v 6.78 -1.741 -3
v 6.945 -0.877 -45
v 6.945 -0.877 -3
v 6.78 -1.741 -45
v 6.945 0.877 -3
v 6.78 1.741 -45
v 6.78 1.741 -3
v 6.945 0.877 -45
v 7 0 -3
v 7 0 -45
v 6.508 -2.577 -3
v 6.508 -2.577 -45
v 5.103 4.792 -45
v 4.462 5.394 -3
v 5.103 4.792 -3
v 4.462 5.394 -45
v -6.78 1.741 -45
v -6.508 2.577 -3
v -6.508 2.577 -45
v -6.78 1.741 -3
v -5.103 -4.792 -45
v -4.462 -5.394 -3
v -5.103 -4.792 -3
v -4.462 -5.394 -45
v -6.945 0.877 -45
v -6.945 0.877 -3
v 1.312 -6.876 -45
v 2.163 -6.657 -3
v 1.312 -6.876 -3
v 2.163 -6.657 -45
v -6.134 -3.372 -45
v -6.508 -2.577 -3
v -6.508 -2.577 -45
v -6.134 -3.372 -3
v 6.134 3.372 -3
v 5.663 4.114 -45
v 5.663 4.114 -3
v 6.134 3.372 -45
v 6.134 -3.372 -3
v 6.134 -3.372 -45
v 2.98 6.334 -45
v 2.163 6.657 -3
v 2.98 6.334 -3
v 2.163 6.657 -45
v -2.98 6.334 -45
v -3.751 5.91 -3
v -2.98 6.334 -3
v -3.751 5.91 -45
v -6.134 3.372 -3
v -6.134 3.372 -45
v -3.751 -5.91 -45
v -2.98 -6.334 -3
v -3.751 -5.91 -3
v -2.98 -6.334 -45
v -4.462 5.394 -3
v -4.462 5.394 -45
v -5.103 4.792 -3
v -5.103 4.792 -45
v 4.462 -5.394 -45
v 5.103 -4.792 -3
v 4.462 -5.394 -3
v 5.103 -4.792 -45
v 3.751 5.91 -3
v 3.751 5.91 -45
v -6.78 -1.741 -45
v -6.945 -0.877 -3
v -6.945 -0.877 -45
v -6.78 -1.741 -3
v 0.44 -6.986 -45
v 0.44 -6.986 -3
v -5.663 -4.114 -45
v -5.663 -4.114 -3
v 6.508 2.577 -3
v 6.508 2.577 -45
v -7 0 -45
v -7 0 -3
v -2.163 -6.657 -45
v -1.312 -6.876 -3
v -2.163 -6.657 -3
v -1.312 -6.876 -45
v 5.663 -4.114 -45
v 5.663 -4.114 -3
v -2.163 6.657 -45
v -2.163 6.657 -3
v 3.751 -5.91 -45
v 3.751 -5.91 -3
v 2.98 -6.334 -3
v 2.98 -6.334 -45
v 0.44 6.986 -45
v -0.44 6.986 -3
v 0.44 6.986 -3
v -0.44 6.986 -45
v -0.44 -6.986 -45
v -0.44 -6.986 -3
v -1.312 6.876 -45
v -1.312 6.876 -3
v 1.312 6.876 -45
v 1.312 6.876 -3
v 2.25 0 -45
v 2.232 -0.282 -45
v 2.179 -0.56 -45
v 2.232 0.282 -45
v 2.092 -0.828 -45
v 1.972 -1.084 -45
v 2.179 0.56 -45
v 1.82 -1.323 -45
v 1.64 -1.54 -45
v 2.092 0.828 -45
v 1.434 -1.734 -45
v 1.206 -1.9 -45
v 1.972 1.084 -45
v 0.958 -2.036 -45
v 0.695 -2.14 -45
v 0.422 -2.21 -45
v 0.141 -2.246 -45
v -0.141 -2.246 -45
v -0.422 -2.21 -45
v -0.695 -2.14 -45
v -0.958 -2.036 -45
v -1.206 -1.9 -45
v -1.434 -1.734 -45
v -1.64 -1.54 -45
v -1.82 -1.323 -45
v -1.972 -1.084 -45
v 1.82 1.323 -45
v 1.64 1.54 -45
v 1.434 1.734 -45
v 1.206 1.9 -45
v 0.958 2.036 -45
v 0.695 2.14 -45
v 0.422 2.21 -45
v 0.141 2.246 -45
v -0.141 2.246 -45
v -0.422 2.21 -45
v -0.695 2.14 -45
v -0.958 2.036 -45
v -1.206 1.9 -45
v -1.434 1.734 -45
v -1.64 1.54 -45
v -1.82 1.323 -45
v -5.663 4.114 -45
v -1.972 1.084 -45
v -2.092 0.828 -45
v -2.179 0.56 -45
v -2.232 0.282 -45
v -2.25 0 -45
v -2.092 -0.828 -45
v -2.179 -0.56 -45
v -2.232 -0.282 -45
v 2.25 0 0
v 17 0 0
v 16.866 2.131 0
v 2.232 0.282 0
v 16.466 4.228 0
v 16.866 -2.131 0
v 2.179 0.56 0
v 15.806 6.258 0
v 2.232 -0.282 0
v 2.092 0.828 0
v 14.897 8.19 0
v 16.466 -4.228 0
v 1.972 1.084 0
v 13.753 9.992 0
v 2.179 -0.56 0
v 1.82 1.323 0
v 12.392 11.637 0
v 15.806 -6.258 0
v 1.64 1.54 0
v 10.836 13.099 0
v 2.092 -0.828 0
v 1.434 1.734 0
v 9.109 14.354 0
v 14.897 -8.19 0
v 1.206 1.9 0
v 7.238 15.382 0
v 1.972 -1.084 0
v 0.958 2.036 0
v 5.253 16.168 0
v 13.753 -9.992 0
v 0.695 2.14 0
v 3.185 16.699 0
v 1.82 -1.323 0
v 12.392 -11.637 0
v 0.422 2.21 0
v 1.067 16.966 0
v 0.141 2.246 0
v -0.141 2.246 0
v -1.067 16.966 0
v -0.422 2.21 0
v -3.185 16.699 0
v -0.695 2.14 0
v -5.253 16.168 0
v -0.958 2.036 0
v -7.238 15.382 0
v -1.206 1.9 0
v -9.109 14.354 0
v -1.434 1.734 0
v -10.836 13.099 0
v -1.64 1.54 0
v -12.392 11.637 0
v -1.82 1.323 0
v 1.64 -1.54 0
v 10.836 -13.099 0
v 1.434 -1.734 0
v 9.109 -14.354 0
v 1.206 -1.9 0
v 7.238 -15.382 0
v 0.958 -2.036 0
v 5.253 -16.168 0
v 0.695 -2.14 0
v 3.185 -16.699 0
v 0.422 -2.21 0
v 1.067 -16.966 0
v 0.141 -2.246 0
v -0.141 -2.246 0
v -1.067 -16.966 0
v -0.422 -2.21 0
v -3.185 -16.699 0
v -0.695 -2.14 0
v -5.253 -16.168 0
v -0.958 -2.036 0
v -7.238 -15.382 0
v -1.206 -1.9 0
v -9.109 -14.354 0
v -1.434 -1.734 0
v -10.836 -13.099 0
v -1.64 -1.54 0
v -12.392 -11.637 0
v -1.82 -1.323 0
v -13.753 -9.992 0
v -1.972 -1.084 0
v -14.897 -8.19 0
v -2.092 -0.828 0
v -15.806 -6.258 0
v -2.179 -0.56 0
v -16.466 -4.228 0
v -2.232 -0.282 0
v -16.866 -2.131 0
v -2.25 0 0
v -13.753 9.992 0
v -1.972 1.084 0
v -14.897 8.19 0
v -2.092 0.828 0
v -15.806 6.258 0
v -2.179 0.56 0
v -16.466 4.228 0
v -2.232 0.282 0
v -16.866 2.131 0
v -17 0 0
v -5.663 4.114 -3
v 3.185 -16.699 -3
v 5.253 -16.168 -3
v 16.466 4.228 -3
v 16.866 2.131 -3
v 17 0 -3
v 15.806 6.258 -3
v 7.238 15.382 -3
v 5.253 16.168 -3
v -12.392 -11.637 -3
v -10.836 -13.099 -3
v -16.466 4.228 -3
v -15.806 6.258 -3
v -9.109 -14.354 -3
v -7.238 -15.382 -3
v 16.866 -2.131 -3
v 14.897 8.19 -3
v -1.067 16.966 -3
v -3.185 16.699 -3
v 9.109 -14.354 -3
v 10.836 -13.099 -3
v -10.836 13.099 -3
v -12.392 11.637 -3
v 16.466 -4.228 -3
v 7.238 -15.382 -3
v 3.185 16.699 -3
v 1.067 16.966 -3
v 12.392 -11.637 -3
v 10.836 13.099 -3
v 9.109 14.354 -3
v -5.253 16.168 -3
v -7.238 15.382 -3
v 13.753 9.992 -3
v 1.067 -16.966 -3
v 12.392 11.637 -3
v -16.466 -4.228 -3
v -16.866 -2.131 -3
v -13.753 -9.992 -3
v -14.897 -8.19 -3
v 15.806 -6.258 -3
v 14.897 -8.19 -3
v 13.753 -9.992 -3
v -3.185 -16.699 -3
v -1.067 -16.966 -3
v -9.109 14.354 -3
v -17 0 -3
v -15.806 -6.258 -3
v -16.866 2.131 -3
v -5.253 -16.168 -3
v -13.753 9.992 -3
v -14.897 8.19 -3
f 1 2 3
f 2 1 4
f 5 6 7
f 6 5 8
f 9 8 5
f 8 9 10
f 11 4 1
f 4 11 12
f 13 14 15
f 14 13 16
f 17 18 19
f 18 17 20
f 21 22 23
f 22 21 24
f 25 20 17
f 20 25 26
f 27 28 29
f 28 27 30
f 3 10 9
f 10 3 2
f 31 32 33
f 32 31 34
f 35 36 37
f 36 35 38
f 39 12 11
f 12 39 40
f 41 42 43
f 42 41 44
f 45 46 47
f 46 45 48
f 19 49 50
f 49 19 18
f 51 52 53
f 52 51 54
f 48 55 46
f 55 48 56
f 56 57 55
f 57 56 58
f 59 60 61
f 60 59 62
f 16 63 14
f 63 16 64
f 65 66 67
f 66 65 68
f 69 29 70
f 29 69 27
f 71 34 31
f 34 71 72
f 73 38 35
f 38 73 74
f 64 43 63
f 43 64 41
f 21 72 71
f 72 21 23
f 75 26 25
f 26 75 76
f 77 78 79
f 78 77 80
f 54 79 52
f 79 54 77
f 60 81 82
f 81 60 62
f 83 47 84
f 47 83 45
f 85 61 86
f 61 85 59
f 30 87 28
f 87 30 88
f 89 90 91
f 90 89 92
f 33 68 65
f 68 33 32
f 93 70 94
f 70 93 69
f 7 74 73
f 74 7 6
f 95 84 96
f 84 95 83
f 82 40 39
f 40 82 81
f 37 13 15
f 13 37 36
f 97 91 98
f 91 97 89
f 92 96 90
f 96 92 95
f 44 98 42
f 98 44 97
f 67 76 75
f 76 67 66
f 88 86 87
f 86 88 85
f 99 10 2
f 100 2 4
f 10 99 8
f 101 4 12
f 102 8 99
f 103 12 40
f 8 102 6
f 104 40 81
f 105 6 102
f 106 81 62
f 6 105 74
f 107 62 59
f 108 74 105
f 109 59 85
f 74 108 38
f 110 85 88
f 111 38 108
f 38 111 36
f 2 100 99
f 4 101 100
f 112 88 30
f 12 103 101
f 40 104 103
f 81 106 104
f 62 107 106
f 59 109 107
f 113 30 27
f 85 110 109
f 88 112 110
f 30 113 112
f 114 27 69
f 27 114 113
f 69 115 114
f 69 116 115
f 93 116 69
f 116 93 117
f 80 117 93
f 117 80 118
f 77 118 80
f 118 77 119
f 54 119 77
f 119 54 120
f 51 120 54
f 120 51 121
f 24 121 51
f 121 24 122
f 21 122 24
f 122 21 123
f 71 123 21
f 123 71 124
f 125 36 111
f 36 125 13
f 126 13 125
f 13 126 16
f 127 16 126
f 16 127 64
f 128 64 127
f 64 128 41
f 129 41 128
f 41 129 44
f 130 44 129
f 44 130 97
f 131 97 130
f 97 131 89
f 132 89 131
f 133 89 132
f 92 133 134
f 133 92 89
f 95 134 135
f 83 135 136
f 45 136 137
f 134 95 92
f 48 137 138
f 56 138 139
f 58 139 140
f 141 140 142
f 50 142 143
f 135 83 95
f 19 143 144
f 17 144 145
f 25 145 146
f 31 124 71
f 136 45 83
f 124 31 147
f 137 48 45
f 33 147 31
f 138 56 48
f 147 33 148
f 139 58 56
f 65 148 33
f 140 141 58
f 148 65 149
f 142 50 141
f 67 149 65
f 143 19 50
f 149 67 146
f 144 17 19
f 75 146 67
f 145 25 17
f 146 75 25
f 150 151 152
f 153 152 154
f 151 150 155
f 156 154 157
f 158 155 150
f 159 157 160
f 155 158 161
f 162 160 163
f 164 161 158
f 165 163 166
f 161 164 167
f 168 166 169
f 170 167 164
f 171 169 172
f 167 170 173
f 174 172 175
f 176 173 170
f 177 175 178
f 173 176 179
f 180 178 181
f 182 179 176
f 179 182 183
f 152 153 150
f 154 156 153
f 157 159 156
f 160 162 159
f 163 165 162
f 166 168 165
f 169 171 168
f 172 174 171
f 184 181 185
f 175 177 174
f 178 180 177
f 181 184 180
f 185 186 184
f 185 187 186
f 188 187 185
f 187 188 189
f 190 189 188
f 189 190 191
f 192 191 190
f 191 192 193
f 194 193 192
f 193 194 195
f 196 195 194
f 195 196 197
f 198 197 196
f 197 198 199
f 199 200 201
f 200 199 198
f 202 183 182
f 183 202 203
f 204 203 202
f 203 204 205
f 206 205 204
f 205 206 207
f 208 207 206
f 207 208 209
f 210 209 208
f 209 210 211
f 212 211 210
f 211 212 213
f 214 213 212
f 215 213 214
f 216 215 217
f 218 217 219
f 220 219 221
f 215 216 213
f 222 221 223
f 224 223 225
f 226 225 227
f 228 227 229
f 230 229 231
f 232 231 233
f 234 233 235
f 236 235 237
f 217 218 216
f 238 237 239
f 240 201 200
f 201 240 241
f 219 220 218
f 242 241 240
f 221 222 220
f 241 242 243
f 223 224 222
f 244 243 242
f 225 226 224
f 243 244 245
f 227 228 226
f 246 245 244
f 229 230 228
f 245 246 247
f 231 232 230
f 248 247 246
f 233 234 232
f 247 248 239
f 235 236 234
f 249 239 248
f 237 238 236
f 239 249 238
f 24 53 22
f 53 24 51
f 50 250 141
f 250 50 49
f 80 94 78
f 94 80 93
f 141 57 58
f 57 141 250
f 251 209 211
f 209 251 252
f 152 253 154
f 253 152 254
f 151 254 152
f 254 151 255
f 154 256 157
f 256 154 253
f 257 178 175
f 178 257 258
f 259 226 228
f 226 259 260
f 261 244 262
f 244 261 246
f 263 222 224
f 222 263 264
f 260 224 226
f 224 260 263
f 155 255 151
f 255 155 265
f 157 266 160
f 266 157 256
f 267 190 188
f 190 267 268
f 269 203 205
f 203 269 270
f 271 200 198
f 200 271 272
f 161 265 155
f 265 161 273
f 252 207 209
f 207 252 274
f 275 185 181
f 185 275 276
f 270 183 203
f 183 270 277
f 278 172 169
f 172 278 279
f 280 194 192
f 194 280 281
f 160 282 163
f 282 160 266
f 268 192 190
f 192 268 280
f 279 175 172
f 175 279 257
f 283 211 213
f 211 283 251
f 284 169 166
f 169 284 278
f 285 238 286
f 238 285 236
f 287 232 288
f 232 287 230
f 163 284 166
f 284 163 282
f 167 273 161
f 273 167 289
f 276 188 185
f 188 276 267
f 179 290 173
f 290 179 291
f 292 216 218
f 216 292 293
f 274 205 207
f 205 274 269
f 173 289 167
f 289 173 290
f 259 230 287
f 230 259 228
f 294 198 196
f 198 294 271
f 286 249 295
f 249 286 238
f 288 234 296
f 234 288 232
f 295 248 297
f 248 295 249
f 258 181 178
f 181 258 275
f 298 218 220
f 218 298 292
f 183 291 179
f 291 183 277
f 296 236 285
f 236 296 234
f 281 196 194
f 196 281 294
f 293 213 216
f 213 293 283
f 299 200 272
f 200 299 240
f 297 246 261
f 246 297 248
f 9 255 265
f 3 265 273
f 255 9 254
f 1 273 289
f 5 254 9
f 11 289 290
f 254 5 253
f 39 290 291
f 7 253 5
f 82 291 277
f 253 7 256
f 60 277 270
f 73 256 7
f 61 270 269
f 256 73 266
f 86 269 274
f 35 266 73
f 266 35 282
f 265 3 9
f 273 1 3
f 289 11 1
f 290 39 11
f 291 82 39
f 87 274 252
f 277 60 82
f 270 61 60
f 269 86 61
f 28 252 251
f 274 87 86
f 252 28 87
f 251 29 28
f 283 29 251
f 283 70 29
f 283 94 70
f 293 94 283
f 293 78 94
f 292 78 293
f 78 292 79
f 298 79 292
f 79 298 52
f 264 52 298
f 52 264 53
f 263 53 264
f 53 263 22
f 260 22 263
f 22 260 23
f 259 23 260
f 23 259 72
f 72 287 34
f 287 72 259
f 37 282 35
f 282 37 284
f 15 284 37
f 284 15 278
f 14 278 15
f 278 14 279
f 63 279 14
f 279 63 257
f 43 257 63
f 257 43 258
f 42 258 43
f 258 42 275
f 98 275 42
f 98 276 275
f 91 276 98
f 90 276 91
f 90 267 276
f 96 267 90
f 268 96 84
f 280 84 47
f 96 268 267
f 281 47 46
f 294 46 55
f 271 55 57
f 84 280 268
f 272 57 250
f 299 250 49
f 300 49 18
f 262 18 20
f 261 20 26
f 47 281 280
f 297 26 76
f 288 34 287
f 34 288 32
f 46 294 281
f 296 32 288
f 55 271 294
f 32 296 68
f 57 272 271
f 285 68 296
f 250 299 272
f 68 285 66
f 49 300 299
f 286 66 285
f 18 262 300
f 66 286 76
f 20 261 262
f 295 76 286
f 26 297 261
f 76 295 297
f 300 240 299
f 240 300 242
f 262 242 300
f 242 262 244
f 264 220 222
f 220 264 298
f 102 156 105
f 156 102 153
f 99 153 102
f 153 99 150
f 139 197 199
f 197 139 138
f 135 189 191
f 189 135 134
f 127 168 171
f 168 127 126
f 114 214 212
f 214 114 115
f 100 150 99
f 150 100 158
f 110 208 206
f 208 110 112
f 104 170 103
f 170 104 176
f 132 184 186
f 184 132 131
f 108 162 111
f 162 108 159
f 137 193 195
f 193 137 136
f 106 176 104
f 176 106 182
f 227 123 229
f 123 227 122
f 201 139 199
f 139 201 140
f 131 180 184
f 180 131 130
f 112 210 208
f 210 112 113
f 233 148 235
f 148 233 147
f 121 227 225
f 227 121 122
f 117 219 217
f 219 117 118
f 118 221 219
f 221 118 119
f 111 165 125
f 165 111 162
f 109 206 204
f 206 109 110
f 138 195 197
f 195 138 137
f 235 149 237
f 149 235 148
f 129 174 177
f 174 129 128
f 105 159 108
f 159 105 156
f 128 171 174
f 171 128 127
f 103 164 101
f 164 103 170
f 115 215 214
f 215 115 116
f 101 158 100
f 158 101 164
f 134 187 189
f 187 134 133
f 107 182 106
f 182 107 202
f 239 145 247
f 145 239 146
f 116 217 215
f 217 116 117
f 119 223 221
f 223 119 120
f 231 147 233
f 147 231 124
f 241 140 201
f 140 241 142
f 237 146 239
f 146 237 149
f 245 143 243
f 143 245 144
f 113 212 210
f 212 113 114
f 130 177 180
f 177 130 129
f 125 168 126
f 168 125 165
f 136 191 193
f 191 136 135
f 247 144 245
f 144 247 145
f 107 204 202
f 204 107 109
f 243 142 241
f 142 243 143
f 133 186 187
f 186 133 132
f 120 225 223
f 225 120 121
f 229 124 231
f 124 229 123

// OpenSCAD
$fn = 50;


difference() {
	union() {
		translate(v = [0, 0, -45.0000000000]) {
			cylinder(h = 45, r = 7.0000000000);
		}
		translate(v = [0, 0, -3.0000000000]) {
			cylinder(h = 3, r = 17.0000000000);
		}
	}
	union() {
		#translate(v = [0, 0, -45]) {
			cylinder(h = 45, r = 2.2500000000);
		}
	}
}
